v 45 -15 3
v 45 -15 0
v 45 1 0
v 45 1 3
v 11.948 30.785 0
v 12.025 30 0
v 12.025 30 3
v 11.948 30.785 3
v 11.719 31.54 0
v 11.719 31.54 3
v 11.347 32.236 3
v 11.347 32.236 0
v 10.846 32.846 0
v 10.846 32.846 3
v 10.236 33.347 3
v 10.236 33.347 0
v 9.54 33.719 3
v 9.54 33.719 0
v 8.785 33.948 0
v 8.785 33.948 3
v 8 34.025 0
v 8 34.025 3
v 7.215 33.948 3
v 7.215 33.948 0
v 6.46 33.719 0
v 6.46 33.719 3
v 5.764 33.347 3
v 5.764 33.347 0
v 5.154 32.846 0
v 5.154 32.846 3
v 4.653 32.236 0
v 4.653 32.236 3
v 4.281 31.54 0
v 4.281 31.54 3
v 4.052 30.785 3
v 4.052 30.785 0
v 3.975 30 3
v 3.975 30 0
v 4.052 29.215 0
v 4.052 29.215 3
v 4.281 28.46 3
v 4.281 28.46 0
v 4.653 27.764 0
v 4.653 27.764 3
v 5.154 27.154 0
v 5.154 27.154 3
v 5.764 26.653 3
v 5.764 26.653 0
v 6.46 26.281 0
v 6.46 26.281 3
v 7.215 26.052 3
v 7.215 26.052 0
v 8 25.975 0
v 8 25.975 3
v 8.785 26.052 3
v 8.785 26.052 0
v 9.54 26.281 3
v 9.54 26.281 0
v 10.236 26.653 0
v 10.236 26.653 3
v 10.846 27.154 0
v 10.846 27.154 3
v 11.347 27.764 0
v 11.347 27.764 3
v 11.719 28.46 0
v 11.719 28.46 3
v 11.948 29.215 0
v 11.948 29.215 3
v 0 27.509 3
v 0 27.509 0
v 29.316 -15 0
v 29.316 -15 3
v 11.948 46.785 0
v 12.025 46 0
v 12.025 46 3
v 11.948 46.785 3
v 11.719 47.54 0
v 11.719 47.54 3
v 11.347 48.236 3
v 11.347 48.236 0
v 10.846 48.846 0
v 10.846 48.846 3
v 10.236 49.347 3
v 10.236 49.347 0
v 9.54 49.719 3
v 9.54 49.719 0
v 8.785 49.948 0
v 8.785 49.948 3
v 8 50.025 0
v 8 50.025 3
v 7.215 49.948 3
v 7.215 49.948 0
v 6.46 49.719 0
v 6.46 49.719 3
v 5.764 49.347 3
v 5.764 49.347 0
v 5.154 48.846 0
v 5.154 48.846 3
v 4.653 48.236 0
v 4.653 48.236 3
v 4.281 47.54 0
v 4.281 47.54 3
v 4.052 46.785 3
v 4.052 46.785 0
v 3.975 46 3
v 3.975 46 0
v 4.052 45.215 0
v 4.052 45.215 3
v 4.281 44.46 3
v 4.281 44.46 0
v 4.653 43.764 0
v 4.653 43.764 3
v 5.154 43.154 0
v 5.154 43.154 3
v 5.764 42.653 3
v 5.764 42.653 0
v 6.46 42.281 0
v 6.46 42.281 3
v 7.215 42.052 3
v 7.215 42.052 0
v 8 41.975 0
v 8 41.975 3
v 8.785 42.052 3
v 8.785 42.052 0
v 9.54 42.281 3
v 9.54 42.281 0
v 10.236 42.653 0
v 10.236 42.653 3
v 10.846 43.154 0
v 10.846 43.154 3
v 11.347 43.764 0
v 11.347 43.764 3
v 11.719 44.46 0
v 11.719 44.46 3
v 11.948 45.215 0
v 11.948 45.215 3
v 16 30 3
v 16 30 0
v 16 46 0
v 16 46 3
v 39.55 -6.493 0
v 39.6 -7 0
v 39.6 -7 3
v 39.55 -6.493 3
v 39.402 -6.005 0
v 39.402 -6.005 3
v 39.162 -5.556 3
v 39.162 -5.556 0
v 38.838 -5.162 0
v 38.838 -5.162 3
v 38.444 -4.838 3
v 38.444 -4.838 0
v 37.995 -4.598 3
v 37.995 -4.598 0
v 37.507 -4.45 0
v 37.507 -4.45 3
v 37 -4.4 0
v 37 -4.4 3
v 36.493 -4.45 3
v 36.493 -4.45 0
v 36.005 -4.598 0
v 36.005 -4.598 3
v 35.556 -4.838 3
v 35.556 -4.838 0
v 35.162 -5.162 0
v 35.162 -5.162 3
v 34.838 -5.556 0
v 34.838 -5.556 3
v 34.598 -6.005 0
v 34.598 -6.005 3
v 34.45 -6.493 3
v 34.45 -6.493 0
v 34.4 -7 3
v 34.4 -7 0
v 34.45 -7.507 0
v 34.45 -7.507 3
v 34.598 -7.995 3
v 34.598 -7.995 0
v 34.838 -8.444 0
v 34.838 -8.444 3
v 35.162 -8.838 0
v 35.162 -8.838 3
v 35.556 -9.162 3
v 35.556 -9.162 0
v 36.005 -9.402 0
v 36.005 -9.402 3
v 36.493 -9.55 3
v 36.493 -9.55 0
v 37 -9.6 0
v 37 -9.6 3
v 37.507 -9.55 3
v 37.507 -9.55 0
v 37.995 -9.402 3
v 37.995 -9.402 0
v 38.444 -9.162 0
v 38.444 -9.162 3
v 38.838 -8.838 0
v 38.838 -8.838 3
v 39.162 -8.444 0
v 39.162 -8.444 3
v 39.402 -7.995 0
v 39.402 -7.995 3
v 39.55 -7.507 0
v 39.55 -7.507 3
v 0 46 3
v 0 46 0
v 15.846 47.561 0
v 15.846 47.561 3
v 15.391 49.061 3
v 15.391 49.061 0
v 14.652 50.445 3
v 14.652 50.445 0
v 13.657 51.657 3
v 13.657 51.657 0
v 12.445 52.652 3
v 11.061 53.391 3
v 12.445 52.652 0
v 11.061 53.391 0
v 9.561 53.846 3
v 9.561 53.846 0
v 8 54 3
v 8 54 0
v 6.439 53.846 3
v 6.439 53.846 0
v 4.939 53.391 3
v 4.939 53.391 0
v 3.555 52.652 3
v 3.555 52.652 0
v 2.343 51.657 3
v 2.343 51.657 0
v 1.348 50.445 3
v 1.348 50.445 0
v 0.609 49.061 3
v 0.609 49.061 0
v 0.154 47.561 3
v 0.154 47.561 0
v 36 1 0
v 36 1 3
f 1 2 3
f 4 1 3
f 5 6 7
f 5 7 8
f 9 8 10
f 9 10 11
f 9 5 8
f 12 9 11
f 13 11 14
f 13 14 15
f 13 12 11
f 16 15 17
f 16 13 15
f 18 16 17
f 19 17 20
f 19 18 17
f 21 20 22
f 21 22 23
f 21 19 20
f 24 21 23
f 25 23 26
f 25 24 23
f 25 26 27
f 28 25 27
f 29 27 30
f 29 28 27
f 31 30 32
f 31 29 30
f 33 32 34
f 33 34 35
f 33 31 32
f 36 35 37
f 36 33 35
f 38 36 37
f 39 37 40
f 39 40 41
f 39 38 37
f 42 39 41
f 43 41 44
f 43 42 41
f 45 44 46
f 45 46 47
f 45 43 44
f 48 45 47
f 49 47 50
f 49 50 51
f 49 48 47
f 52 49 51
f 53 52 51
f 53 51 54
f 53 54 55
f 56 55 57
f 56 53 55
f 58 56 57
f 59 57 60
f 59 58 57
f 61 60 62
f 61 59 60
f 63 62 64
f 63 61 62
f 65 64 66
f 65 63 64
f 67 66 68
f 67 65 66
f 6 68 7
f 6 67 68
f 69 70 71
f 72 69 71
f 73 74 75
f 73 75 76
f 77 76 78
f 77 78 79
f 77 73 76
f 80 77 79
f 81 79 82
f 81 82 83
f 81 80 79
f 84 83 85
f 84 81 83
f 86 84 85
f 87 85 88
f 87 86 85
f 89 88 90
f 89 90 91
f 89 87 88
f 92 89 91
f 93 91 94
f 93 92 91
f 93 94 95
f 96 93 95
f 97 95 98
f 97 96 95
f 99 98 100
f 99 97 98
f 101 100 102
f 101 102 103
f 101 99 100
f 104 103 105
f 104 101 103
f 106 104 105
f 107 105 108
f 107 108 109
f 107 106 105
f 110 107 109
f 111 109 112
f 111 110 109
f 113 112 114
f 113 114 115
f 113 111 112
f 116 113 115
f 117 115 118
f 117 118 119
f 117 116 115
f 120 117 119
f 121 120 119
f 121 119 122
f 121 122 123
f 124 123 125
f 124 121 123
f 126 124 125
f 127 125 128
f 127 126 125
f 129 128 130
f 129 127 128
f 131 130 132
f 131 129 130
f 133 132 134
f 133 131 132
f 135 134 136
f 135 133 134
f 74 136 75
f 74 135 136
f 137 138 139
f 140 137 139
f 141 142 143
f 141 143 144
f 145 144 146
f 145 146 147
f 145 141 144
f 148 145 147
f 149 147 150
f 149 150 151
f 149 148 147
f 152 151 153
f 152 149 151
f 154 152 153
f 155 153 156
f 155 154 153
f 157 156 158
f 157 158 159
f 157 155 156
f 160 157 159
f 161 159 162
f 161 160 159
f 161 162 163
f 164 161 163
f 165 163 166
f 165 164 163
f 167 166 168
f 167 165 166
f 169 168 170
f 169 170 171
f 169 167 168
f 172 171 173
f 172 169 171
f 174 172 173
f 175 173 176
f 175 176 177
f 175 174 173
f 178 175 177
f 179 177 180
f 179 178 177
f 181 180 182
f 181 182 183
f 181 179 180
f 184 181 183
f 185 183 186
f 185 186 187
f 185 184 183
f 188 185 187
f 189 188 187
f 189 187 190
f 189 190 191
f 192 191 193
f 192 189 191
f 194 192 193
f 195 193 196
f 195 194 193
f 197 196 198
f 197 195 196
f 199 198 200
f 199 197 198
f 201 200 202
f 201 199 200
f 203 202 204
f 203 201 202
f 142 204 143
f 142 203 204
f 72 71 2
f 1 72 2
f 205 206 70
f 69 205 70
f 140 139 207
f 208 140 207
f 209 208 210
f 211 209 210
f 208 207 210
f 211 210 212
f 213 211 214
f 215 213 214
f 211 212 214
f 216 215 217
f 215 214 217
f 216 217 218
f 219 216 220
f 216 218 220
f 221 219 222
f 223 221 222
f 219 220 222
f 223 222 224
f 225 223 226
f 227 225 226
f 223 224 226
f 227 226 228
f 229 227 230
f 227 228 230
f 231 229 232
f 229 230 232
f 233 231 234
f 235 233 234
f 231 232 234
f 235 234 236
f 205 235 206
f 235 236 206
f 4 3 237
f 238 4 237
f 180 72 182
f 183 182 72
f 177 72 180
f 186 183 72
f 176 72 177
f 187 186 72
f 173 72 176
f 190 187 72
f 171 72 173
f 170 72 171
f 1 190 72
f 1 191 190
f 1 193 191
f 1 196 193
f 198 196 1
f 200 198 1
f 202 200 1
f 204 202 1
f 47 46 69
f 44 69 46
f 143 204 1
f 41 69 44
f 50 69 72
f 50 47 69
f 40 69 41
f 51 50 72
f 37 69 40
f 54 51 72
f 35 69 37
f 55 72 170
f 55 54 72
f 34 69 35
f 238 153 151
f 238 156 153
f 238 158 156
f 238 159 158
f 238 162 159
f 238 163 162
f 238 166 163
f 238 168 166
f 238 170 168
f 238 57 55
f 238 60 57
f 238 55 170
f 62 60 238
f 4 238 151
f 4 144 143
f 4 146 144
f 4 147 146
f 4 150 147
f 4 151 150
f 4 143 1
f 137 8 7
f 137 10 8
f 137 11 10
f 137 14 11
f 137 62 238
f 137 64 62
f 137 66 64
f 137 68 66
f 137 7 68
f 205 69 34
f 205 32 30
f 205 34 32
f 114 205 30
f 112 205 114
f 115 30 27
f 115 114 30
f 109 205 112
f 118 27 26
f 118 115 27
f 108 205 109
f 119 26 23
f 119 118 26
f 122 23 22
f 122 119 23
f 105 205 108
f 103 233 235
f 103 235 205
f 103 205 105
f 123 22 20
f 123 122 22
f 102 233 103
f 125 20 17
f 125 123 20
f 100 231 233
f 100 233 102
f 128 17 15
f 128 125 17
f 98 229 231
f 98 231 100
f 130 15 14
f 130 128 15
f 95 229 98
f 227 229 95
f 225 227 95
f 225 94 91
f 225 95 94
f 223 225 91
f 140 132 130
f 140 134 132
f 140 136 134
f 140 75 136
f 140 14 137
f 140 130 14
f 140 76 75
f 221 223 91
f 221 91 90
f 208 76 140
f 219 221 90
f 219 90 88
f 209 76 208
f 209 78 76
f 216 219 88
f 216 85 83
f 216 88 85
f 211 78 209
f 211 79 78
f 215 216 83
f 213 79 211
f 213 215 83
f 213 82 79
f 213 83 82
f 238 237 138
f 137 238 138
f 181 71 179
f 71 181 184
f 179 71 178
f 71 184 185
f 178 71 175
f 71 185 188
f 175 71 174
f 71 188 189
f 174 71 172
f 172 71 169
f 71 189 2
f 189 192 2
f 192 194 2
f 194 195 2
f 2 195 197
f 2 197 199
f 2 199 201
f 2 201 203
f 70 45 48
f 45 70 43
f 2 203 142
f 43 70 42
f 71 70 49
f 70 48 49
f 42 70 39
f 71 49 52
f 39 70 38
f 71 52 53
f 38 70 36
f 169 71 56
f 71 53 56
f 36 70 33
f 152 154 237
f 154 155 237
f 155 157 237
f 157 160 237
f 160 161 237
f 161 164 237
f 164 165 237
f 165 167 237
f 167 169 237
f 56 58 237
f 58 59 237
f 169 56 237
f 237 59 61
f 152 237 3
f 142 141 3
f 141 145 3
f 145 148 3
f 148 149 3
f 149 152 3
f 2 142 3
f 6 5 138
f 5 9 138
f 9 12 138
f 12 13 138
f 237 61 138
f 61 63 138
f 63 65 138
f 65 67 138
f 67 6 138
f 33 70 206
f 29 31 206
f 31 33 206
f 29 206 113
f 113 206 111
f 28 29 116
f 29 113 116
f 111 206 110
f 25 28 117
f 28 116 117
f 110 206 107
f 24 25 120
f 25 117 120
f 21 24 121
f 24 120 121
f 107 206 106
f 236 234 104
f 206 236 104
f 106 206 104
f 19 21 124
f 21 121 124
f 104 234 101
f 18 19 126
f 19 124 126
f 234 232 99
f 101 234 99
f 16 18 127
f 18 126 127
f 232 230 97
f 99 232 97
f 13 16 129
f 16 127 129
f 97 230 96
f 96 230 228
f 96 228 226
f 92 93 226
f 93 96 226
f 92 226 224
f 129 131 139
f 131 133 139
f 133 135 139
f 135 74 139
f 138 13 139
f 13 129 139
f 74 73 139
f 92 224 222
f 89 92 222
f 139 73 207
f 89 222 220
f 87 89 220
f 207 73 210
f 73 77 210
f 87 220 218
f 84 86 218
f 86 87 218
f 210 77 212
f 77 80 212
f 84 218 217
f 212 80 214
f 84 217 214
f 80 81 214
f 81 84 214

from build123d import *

# Parameters (mm, degrees)
SKETCH_1_R      = 2.6
SKETCH_1_R_2    = 4.025
EXTRUDE_1_DEPTH = 3


with BuildPart() as part:
    # ｽｹｯﾁ1 → ﾎﾞｽ - 押し出し1 (new body)
    with BuildSketch(Plane.XY):
        with BuildLine():
            Line((0, 46), (0, 27.508868037))
            Line((0, 27.508868037), (29.316460715, -15))
            Line((29.316460715, -15), (45, -15))
            Line((45, -15), (45, 1))
            Line((45, 1), (36, 1))
            Line((36, 1), (16, 30))
            Line((16, 30), (16, 46))
            ThreePointArc((16, 46), (8, 54), (0, 46))
        make_face()
        with Locations((37, -7)):
            Circle(SKETCH_1_R, mode=Mode.SUBTRACT)
        with Locations((8, 46)):
            Circle(SKETCH_1_R_2, mode=Mode.SUBTRACT)
        with Locations((8, 30)):
            Circle(SKETCH_1_R_2, mode=Mode.SUBTRACT)
    extrude(amount=EXTRUDE_1_DEPTH)


solid = part.part
